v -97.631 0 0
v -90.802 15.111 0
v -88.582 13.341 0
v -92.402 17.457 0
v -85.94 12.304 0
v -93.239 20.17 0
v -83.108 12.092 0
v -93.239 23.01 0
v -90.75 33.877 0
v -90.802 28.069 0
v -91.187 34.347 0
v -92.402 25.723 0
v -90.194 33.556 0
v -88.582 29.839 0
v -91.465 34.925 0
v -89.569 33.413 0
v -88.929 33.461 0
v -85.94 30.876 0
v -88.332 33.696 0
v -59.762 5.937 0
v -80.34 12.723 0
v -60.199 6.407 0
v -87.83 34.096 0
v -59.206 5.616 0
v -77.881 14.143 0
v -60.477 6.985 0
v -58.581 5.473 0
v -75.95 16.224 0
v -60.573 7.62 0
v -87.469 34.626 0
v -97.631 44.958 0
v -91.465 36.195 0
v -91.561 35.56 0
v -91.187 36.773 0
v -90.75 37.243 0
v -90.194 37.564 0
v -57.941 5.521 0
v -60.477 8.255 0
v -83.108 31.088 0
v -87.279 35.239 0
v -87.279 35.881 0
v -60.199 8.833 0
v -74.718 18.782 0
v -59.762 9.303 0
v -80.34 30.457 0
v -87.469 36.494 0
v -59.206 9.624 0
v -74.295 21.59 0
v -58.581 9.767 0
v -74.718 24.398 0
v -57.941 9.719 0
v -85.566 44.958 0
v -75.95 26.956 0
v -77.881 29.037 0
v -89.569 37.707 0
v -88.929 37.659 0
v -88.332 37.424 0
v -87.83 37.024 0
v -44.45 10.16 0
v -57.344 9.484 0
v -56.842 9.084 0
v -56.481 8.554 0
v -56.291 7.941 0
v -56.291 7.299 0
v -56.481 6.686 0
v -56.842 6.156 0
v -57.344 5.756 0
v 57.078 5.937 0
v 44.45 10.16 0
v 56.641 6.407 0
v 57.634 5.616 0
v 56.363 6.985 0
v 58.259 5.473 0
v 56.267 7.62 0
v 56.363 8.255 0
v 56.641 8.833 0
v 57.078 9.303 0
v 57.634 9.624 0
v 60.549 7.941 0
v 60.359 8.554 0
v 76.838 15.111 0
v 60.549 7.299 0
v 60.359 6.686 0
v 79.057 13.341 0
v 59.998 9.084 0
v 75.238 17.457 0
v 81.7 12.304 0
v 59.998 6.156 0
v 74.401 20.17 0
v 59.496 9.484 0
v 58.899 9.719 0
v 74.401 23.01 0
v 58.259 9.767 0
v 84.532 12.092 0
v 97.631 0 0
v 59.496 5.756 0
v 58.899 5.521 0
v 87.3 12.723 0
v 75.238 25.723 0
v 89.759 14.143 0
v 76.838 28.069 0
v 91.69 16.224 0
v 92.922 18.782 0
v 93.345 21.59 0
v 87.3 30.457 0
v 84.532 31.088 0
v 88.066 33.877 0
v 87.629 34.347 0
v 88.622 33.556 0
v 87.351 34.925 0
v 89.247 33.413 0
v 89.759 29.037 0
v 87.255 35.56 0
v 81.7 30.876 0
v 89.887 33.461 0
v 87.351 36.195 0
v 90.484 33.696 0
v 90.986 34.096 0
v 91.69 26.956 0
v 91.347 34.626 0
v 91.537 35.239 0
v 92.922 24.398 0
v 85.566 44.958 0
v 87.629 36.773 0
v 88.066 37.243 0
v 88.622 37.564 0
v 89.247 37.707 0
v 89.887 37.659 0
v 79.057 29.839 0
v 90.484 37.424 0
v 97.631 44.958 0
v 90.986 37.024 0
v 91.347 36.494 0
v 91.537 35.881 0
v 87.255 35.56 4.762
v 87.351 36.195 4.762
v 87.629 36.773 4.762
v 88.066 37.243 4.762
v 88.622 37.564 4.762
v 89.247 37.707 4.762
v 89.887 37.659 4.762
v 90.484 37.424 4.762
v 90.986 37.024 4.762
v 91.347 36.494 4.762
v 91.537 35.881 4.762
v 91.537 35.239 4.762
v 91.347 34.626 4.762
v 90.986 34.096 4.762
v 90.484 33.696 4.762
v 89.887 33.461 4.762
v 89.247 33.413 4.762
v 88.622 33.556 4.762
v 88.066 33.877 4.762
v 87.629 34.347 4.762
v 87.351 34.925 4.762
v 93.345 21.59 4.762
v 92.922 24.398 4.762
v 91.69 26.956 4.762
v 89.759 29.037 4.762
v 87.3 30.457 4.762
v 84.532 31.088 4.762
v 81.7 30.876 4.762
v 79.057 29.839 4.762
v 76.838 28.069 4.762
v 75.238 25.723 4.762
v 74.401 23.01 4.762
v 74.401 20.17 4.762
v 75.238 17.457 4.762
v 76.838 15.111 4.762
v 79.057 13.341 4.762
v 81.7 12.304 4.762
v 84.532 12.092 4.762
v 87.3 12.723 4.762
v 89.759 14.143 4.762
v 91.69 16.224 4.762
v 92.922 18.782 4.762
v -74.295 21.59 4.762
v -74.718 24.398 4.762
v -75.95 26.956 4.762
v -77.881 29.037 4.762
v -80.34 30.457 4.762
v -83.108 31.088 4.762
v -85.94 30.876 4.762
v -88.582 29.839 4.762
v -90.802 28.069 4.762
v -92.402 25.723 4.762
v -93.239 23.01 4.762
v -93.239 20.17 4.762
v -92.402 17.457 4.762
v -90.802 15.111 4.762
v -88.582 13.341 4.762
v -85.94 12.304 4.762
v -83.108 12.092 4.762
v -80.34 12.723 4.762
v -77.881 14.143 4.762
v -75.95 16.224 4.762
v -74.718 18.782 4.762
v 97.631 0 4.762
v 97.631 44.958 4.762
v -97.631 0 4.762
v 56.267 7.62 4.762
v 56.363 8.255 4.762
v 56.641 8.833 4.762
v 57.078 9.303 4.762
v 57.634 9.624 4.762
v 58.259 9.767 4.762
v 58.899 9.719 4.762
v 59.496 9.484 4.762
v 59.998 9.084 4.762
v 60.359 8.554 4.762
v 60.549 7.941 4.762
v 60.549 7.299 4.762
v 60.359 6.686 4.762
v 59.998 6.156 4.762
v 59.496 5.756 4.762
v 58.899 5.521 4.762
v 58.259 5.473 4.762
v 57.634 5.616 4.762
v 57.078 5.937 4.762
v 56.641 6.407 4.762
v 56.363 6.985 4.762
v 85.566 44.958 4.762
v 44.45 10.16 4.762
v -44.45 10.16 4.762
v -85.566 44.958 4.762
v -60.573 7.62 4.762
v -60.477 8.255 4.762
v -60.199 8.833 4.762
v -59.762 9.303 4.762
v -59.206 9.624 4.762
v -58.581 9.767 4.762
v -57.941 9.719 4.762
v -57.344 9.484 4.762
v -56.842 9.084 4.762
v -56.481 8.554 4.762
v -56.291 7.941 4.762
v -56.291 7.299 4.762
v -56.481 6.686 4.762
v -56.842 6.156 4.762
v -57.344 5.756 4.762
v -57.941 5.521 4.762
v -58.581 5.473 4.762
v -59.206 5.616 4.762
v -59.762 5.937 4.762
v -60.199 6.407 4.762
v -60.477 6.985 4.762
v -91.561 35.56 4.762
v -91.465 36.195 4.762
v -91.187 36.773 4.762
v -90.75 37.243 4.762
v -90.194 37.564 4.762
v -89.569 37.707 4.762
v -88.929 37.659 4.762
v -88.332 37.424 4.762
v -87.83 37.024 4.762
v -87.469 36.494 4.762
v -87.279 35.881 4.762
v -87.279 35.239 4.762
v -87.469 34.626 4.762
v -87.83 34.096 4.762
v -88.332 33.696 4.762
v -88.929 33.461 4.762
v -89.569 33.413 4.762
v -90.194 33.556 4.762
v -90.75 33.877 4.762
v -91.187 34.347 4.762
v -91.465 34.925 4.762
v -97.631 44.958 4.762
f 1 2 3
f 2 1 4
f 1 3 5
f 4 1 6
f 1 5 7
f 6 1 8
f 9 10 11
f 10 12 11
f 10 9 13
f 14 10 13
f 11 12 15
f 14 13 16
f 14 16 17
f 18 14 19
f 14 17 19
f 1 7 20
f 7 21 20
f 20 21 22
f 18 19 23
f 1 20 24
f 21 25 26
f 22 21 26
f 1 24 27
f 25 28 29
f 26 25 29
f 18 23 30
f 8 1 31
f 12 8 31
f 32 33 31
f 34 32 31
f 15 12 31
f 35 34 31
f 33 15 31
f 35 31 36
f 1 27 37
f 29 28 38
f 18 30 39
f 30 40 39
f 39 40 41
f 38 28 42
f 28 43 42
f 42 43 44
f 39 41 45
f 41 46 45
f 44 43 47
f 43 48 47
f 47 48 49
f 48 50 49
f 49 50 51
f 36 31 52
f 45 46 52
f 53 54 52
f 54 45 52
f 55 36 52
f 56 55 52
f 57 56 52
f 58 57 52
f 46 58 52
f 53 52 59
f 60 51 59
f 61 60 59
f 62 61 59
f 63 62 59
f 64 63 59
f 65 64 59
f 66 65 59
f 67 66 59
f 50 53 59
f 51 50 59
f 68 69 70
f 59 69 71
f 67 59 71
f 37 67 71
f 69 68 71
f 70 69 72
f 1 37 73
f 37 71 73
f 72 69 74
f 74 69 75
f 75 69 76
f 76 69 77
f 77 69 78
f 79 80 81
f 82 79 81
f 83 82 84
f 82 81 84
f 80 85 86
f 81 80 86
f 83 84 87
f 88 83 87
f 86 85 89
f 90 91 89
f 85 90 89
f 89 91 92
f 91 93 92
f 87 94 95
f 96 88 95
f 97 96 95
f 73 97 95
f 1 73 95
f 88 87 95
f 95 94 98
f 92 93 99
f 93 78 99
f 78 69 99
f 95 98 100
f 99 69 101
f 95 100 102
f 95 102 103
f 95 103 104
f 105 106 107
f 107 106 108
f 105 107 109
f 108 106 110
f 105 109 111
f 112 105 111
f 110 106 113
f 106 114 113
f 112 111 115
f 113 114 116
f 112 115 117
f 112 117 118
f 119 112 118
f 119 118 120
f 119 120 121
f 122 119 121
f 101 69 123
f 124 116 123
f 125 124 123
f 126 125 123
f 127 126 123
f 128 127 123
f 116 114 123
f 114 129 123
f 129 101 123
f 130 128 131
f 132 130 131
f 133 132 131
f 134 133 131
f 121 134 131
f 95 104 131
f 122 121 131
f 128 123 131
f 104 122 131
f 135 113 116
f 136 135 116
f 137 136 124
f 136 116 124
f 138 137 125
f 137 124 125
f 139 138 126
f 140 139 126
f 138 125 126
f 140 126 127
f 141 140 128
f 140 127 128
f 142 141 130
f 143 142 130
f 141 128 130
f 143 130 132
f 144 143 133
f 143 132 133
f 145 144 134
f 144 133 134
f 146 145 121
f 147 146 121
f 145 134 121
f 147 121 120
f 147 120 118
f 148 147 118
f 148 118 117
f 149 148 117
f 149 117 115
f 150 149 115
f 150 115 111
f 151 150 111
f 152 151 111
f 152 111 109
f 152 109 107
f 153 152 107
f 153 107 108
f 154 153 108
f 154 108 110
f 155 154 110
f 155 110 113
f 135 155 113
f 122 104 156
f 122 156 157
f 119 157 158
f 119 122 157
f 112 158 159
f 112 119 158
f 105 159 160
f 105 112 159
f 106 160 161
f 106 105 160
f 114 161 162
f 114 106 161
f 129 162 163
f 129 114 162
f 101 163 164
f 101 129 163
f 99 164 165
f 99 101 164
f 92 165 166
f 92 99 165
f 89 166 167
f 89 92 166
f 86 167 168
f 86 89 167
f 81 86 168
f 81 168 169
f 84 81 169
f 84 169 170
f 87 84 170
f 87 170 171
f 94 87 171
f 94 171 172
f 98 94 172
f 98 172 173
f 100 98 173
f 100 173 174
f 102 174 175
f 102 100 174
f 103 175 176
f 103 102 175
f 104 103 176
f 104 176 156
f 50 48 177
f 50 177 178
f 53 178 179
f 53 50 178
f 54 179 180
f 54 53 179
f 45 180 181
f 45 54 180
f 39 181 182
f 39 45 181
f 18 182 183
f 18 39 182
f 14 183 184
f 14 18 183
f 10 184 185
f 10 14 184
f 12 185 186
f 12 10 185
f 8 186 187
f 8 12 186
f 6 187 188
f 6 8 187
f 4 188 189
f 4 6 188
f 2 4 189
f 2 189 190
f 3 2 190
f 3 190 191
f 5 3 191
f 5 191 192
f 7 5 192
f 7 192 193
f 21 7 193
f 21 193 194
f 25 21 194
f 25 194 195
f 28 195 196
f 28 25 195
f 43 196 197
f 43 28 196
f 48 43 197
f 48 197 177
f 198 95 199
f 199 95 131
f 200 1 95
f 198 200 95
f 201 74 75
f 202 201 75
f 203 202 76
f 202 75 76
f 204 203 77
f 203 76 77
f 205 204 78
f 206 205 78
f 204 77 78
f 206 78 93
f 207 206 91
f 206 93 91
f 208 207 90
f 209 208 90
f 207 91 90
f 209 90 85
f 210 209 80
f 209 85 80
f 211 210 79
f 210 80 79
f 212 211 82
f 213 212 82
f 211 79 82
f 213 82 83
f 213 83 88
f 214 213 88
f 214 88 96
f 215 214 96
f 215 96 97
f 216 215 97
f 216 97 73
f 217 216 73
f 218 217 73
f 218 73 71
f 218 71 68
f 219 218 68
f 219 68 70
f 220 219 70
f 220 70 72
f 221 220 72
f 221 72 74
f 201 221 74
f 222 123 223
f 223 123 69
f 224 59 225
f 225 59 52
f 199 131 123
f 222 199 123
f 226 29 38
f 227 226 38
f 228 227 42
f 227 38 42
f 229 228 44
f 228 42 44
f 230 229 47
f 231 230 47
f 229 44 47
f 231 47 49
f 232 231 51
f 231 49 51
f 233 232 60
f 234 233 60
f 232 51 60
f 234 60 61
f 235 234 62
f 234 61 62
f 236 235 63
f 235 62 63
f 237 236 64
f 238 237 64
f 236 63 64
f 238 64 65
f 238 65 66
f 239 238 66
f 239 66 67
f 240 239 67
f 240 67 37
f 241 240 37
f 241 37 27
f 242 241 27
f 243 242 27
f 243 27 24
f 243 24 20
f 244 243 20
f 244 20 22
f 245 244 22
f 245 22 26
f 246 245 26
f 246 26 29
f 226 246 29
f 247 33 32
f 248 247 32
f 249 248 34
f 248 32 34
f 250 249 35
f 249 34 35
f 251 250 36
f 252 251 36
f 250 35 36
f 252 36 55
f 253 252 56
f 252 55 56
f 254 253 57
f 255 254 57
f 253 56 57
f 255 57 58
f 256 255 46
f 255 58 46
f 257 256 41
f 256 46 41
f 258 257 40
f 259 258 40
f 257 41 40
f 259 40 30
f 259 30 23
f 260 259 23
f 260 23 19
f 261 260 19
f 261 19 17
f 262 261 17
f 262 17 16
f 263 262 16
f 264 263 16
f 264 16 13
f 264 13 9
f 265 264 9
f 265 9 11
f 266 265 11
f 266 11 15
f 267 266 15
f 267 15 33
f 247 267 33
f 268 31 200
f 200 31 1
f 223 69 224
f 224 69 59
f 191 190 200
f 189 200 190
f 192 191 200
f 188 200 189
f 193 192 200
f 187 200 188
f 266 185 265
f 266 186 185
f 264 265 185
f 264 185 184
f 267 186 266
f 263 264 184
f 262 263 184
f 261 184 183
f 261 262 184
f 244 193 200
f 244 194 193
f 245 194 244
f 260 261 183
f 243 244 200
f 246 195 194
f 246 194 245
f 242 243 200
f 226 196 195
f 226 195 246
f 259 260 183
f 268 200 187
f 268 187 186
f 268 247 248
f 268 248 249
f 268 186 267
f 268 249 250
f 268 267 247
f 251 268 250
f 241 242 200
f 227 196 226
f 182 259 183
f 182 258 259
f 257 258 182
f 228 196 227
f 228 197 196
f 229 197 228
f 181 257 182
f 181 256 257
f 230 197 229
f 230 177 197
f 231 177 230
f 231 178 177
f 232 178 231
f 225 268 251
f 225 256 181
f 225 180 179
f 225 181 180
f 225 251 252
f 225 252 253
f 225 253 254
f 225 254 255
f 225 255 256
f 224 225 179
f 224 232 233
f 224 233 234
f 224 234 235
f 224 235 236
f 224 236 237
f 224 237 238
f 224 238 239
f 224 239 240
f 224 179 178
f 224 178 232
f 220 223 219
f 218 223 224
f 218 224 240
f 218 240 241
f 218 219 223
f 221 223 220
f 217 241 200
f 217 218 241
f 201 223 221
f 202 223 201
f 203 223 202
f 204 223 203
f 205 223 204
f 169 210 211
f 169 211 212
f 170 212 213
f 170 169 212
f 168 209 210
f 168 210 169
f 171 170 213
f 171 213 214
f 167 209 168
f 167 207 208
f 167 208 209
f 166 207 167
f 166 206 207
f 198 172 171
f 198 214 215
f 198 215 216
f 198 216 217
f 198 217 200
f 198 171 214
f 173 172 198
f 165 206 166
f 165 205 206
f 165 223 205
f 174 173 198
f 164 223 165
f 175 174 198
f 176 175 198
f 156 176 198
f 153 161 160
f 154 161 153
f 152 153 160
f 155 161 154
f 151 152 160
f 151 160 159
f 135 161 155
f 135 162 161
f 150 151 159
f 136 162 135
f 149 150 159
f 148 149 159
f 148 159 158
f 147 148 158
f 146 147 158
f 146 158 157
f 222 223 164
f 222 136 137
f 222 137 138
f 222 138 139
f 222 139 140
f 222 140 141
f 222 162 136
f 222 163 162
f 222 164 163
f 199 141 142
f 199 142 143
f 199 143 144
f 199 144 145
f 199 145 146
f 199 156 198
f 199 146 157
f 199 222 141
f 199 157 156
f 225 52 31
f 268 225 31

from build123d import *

# Parameters (mm, degrees)
SKETCH1_R             = 9.525
BOSS_EXTRUDE1_DEPTH   = 4.7625
F_6_CLEARANCE_HOLE1_D = 4.3053


with BuildPart() as part:
    # Sketch1 → Boss-Extrude1 (new body)
    with BuildSketch(Plane.XY):
        Polygon((-44.45, 10.16), (-85.56625, 44.958), (-97.63125, 44.958), (-97.63125, 0), (97.63125, 0), (97.63125, 44.958), (85.56625, 44.958), (44.45, 10.16), align=None)
        with Locations((-83.82, 21.59)):
            Circle(SKETCH1_R, mode=Mode.SUBTRACT)
        with Locations((83.82, 21.59)):
            Circle(SKETCH1_R, mode=Mode.SUBTRACT)
    extrude(amount=BOSS_EXTRUDE1_DEPTH)

    # #6 Clearance Hole1 (through all)
    with Locations(Plane.XY.offset(4.7625)):
        with Locations((89.408, 35.56), (58.42, 7.62), (-58.42, 7.62), (-89.408, 35.56)):
            Hole(F_6_CLEARANCE_HOLE1_D / 2)


solid = part.part
